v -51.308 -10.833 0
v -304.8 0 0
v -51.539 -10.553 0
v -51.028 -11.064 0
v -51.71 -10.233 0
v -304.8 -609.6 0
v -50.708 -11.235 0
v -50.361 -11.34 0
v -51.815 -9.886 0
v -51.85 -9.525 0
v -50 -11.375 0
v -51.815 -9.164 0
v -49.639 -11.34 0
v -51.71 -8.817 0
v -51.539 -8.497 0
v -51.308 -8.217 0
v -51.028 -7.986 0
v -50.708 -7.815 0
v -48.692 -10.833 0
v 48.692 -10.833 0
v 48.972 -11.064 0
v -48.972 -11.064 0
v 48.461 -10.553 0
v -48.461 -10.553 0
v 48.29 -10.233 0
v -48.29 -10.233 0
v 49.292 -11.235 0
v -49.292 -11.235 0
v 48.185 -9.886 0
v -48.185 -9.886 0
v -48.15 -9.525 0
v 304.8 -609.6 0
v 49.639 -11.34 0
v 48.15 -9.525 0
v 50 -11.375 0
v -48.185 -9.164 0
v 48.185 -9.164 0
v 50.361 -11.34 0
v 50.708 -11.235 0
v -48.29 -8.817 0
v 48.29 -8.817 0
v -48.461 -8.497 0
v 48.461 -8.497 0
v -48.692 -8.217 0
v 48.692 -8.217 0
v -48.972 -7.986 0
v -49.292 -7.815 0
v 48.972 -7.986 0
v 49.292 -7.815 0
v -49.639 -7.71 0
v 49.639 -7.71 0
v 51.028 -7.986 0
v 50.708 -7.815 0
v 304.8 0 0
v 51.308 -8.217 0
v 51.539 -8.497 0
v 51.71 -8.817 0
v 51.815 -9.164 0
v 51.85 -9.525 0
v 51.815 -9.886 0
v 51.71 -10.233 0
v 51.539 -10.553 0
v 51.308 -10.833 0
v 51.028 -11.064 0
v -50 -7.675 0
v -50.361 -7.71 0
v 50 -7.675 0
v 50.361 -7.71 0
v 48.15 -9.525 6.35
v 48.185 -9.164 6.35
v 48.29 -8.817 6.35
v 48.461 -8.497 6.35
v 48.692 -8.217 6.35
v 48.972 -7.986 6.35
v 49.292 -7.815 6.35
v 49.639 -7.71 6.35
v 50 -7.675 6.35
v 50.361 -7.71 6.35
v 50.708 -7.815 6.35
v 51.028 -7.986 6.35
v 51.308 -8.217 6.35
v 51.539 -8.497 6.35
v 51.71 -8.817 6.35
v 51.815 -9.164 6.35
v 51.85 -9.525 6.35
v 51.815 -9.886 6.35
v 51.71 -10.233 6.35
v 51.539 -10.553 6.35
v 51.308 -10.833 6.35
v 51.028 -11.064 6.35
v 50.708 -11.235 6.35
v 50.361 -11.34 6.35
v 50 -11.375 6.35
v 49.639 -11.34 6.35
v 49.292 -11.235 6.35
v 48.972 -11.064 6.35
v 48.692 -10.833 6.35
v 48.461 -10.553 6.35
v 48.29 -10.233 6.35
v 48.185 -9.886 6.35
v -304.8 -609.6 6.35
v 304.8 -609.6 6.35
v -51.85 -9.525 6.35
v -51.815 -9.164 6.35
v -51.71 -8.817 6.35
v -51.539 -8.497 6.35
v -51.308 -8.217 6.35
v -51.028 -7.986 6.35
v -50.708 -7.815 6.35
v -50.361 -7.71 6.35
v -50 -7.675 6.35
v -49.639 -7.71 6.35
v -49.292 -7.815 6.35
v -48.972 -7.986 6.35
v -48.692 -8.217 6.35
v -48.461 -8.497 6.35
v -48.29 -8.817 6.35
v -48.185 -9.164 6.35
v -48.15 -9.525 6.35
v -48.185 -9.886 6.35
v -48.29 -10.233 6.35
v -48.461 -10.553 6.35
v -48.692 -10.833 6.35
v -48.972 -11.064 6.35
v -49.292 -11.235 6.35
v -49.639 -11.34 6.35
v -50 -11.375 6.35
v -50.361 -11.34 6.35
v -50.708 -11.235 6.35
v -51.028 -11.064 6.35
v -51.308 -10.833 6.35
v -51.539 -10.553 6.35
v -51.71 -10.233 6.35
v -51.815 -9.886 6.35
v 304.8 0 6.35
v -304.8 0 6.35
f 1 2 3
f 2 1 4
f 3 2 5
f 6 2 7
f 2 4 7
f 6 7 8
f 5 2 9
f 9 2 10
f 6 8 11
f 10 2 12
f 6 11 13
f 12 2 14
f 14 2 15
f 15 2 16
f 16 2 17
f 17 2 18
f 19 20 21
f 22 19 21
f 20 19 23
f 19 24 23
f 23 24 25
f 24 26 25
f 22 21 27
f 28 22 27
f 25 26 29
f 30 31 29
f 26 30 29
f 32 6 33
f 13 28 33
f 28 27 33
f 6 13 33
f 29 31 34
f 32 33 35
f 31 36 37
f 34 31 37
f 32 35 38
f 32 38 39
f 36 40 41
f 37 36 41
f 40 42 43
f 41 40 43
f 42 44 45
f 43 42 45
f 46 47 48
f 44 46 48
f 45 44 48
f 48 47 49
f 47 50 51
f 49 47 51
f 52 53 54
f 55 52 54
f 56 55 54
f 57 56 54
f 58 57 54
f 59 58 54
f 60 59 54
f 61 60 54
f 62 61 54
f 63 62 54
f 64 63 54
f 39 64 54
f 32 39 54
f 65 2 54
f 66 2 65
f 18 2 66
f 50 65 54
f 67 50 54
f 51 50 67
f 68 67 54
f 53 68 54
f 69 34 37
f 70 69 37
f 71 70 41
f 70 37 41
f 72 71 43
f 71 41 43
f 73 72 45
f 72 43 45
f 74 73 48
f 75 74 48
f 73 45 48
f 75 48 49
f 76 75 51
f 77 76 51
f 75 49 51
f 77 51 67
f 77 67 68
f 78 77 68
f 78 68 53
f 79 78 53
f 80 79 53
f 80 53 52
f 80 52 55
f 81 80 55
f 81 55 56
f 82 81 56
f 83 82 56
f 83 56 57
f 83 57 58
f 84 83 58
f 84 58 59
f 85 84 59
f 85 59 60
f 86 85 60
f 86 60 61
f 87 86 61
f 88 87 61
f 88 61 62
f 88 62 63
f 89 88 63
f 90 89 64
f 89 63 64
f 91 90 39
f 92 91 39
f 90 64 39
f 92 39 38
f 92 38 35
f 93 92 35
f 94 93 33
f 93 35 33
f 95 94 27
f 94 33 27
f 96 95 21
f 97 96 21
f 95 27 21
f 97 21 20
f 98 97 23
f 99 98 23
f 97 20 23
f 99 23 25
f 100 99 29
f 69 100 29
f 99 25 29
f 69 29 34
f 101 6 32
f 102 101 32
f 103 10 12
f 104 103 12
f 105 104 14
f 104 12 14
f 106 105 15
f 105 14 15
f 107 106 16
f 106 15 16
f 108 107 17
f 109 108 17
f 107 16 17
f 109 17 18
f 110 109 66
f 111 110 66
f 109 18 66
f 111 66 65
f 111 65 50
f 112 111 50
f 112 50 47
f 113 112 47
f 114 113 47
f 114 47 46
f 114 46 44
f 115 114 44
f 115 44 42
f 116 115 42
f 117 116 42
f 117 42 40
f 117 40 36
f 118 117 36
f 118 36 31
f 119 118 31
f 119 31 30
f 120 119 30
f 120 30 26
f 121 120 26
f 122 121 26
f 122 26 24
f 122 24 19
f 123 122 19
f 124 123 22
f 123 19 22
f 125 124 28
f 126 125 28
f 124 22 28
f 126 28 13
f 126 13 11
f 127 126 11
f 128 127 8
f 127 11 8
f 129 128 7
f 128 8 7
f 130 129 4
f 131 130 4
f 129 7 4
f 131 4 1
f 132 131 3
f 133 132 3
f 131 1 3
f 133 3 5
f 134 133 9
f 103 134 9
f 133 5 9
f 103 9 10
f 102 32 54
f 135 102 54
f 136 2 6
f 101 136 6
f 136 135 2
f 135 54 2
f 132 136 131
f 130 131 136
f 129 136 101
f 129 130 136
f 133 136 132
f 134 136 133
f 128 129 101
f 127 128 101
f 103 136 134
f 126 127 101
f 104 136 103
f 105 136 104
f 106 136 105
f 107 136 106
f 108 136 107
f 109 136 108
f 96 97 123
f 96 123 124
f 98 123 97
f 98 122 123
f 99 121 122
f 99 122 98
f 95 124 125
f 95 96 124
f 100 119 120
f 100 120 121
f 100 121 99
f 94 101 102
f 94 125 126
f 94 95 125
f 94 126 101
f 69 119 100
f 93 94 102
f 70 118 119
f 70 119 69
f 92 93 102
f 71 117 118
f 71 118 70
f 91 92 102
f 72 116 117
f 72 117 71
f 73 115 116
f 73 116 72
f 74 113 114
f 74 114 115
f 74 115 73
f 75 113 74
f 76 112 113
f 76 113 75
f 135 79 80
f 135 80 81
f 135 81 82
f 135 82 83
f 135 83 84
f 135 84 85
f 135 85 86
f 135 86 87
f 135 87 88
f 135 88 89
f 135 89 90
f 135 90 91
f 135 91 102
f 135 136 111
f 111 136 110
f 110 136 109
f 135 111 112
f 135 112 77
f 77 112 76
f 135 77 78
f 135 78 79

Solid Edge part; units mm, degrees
sketch "Sketch1" plane through (0, 0, 0) normal (0, 0, 1) x (1, 0, 0)
  line L0 (-304.8, -609.6) -> (304.8, -609.6)
  line L1 (304.8, -609.6) -> (304.8, 0)
  line L2 (304.8, 0) -> (-304.8, 0)
  line L3 (-304.8, 0) -> (-304.8, -609.6)
  dimension "D1" = 609.6
  dimension "D2" = 609.6
extrude "Protrusion1" add sketch "Sketch1" along normal blind 6.35
sketch "Sketch2" plane through (0, 0, 0) normal (0, 0, -1) x (-1, 0, 0)
  circle A0 centre (-50, -9.525) radius 1.8504
  circle A1 centre (50, -9.525) radius 1.8504
  dimension "D1" = 3.7008
  dimension "D2" = 100.0001
  dimension "D3" = 9.525
extrude "Cutout1" cut sketch "Sketch2" against normal through all
properties material "Wood, Pine"
